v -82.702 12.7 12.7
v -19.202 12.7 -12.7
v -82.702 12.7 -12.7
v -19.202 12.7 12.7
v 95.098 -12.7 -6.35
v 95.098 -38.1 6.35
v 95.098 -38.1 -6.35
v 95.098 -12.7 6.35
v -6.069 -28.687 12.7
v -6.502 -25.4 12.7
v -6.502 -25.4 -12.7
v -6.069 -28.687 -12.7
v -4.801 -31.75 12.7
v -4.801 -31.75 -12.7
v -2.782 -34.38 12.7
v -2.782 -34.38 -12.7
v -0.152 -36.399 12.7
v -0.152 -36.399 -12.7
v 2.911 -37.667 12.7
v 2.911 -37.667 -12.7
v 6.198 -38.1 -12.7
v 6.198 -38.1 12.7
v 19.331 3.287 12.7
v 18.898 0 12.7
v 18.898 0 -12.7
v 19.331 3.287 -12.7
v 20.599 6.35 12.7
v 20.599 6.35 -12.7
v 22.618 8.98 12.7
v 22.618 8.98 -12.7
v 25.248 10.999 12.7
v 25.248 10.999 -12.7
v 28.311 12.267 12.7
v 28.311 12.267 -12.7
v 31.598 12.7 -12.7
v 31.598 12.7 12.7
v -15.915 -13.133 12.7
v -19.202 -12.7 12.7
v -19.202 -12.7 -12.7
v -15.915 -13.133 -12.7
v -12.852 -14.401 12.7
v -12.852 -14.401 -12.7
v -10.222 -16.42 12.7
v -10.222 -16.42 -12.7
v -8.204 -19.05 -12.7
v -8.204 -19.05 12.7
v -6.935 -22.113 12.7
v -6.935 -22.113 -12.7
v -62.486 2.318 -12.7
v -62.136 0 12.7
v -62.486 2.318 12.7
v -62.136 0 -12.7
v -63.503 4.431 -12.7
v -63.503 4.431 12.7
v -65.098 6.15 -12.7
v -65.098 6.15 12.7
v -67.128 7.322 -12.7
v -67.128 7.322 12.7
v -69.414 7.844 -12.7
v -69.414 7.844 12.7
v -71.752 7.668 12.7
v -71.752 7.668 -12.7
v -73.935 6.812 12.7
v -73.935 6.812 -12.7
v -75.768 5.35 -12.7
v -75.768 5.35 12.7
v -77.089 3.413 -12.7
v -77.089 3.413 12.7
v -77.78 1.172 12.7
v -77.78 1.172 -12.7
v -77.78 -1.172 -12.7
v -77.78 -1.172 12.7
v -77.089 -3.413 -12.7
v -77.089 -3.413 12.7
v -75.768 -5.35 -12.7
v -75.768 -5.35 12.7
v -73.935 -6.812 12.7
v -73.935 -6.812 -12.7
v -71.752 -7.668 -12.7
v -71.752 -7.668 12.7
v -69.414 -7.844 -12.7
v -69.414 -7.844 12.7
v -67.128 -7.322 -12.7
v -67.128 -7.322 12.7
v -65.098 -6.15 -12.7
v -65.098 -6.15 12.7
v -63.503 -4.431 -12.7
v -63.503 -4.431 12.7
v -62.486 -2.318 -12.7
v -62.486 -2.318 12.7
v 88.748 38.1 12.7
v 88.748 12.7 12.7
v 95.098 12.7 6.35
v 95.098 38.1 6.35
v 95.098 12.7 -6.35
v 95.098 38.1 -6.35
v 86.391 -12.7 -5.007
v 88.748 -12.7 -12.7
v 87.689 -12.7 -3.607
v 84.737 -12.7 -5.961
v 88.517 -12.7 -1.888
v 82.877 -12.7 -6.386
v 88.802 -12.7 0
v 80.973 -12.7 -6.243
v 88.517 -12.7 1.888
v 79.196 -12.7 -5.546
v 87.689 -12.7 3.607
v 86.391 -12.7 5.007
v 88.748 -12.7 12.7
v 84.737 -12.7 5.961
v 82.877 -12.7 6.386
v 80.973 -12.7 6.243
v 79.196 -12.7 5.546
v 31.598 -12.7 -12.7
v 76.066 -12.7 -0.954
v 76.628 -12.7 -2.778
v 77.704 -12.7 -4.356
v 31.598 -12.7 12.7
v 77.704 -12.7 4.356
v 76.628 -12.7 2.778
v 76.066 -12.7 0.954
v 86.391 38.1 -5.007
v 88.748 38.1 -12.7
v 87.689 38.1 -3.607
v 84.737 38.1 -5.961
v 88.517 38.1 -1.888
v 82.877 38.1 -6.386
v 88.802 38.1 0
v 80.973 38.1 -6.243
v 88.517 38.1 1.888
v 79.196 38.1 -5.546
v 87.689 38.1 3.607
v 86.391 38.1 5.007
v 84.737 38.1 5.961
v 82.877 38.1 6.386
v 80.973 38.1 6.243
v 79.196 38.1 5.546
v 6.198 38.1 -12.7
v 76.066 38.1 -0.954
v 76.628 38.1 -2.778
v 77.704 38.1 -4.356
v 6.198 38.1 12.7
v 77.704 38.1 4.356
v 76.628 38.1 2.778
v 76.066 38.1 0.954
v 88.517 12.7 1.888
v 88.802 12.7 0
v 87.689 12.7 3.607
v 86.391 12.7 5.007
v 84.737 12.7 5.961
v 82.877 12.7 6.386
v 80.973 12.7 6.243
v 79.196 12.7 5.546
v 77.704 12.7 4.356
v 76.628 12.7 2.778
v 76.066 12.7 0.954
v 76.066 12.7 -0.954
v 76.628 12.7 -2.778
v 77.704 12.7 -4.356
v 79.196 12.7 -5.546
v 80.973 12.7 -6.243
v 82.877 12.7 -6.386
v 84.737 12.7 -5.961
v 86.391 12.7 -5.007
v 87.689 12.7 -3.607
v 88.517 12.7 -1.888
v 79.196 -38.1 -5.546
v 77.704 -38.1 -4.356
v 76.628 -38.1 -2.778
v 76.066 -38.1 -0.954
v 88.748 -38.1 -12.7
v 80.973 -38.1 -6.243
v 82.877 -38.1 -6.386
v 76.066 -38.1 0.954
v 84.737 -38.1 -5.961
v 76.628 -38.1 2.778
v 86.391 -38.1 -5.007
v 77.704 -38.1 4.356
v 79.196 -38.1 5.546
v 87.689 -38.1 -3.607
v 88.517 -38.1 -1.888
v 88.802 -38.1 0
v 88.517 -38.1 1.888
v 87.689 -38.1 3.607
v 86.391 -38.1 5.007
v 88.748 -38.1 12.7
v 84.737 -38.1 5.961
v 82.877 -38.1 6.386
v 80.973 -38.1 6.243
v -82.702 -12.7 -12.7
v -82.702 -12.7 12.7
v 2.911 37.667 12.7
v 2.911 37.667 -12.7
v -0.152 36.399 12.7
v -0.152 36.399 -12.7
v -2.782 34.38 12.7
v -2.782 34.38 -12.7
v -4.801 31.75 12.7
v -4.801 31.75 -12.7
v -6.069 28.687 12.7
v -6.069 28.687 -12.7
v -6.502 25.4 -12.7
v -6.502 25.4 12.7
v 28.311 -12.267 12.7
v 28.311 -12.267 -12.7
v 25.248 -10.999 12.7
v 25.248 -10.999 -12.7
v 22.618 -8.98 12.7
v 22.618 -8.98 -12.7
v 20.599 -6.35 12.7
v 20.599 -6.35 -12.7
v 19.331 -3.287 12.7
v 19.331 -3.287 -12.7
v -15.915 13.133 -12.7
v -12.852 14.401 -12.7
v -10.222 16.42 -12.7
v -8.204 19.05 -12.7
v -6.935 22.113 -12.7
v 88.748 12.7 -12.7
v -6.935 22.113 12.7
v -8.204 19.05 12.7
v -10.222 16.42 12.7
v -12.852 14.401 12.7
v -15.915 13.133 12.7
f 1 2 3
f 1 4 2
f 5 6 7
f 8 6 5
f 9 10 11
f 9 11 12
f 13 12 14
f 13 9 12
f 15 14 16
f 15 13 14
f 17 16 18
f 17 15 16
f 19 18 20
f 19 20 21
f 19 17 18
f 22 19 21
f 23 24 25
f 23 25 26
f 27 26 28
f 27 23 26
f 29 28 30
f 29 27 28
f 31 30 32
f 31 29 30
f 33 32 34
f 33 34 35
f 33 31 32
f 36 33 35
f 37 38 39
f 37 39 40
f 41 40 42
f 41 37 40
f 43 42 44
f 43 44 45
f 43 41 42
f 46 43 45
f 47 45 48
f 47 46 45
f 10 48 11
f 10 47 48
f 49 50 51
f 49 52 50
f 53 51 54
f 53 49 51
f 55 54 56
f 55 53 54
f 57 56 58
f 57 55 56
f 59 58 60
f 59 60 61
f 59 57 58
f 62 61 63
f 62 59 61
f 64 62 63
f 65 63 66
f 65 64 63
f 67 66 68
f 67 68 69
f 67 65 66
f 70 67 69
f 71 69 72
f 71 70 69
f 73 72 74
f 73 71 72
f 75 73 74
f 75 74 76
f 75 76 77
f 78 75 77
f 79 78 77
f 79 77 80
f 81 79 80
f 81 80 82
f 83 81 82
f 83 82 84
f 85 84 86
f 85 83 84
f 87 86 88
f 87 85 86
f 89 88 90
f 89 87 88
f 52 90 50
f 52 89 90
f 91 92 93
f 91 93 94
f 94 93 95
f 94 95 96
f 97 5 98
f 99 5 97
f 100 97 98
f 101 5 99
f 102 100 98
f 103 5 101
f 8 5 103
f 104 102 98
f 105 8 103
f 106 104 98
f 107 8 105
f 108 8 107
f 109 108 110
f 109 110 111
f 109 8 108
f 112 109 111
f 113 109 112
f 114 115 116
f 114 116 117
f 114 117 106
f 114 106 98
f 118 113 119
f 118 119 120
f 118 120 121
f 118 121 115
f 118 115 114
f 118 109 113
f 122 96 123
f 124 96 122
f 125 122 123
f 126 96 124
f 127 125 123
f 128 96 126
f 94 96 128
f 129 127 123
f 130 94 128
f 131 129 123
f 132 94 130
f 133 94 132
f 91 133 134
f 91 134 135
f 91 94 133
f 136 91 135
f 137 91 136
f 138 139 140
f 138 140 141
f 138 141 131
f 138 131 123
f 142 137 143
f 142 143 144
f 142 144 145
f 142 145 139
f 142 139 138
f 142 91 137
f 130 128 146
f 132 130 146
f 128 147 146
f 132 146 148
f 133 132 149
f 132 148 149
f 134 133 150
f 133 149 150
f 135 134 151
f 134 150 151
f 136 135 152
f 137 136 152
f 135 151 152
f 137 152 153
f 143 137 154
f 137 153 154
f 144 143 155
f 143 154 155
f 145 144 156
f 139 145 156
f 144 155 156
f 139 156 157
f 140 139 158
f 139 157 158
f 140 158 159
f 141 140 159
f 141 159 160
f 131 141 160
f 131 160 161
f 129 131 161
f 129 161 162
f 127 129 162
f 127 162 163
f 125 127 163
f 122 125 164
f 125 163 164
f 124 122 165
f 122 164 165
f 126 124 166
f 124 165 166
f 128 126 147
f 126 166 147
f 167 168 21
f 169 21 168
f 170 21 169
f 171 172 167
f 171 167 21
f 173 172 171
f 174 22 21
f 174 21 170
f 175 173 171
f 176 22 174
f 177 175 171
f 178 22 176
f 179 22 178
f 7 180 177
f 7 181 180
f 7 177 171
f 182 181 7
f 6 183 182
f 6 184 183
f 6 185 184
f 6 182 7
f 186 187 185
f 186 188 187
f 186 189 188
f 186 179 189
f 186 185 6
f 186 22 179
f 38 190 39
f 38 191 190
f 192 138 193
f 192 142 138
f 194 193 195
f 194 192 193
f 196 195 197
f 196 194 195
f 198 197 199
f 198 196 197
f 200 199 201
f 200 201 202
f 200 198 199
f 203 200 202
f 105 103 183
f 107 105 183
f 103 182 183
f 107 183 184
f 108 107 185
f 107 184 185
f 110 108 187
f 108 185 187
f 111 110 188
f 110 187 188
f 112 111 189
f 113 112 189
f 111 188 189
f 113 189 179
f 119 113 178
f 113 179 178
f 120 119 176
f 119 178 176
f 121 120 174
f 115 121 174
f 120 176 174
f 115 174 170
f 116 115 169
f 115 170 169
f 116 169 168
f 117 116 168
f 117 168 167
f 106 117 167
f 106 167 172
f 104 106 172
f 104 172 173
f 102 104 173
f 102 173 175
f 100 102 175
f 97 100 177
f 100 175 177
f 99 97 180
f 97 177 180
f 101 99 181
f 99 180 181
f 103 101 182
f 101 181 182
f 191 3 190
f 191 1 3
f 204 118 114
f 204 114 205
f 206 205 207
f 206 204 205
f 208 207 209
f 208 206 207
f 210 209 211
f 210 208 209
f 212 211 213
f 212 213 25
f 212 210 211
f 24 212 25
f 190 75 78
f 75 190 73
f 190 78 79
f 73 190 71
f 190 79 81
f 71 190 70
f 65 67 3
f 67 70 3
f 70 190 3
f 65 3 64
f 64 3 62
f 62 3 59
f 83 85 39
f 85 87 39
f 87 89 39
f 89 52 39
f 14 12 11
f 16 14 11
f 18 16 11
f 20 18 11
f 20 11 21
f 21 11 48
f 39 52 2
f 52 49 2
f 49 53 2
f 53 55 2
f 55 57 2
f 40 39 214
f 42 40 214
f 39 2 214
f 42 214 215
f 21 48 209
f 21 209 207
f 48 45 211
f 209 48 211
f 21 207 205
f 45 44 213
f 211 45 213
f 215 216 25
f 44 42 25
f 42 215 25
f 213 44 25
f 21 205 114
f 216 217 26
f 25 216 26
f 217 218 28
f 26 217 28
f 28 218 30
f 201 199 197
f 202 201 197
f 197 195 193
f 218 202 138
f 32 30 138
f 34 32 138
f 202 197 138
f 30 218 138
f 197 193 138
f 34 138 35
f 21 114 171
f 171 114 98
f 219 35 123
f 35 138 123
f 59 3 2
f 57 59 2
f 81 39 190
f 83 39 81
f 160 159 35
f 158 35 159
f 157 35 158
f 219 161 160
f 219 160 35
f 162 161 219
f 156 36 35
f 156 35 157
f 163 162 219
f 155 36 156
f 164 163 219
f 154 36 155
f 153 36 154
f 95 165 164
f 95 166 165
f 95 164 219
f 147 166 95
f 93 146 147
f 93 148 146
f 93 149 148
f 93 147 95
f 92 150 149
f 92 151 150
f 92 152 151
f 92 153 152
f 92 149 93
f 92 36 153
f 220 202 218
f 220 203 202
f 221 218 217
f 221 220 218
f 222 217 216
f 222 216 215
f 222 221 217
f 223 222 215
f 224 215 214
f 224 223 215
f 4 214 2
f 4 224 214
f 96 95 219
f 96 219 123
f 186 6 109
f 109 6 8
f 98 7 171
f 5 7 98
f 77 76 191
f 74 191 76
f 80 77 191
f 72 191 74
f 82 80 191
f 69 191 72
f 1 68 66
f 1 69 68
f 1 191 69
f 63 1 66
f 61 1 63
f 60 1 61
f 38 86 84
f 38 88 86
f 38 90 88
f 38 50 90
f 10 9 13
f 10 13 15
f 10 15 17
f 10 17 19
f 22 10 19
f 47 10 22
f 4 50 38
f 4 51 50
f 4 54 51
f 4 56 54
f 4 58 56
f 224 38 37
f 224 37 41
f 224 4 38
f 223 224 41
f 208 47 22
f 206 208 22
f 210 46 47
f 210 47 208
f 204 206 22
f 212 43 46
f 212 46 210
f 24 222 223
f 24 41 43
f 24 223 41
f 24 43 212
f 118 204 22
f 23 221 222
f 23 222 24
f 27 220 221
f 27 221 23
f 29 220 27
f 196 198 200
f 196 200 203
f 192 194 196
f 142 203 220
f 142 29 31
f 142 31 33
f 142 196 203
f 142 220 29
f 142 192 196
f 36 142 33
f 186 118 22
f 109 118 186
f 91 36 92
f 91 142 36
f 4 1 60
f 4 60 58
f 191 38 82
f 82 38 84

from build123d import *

# Parameters (mm, degrees)
F0_R     = 7.865612
F1_DEPTH = 12.7
F2_R     = 6.403691
F3_DEPTH = 44.45
F4_SIZE  = 6.35
F5_SIZE  = 6.35


with BuildPart() as f1:
    # F0 (on Top) → F1 (new body, symmetric)
    with BuildSketch(Plane.XY):
        with BuildLine():
            Line((-82.702047, -12.7), (-19.202047, -12.7))
            ThreePointArc((-19.202047, -12.7), (-10.221791, -16.419744), (-6.502047, -25.4))
            ThreePointArc((-6.502047, -25.4), (-2.782303, -34.380256), (6.197953, -38.1))
            Line((6.197953, -38.1), (95.097953, -38.1))
            Line((95.097953, -38.1), (95.097953, -12.7))
            Line((95.097953, -12.7), (31.597953, -12.7))
            ThreePointArc((31.597953, -12.7), (22.617697, -8.980256), (18.897953, 0))
            ThreePointArc((18.897953, 0), (22.617697, 8.980256), (31.597953, 12.7))
            Line((31.597953, 12.7), (95.097953, 12.7))
            Line((95.097953, 12.7), (95.097953, 38.1))
            Line((95.097953, 38.1), (6.197953, 38.1))
            ThreePointArc((6.197953, 38.1), (-2.782303, 34.380256), (-6.502047, 25.4))
            ThreePointArc((-6.502047, 25.4), (-10.221791, 16.419744), (-19.202047, 12.7))
            Line((-19.202047, 12.7), (-82.702047, 12.7))
            Line((-82.702047, 12.7), (-82.702047, -12.7))
        make_face()
        with Locations((-70.002047, 0)):
            Circle(F0_R, mode=Mode.SUBTRACT)
    extrude(amount=F1_DEPTH, both=True)

    # F2 (on Front) → F3 (cut, symmetric)
    with BuildSketch(Plane.XZ):
        with Locations((82.397953, 0)):
            Circle(F2_R)
    extrude(amount=F3_DEPTH, both=True, mode=Mode.SUBTRACT)

    # F4
    f4_edges = [f1.edges().sort_by_distance(p)[0] for p in [
        (95.097953, -25.4, 12.7),
        (95.097953, -25.4, -12.7),
    ]]
    chamfer(f4_edges, length=F4_SIZE)

    # F5
    f5_edges = [f1.edges().sort_by_distance(p)[0] for p in [
        (95.097953, 25.4, 12.7),
        (95.097953, 25.4, -12.7),
    ]]
    chamfer(f5_edges, length=F5_SIZE)


solid = f1.part
